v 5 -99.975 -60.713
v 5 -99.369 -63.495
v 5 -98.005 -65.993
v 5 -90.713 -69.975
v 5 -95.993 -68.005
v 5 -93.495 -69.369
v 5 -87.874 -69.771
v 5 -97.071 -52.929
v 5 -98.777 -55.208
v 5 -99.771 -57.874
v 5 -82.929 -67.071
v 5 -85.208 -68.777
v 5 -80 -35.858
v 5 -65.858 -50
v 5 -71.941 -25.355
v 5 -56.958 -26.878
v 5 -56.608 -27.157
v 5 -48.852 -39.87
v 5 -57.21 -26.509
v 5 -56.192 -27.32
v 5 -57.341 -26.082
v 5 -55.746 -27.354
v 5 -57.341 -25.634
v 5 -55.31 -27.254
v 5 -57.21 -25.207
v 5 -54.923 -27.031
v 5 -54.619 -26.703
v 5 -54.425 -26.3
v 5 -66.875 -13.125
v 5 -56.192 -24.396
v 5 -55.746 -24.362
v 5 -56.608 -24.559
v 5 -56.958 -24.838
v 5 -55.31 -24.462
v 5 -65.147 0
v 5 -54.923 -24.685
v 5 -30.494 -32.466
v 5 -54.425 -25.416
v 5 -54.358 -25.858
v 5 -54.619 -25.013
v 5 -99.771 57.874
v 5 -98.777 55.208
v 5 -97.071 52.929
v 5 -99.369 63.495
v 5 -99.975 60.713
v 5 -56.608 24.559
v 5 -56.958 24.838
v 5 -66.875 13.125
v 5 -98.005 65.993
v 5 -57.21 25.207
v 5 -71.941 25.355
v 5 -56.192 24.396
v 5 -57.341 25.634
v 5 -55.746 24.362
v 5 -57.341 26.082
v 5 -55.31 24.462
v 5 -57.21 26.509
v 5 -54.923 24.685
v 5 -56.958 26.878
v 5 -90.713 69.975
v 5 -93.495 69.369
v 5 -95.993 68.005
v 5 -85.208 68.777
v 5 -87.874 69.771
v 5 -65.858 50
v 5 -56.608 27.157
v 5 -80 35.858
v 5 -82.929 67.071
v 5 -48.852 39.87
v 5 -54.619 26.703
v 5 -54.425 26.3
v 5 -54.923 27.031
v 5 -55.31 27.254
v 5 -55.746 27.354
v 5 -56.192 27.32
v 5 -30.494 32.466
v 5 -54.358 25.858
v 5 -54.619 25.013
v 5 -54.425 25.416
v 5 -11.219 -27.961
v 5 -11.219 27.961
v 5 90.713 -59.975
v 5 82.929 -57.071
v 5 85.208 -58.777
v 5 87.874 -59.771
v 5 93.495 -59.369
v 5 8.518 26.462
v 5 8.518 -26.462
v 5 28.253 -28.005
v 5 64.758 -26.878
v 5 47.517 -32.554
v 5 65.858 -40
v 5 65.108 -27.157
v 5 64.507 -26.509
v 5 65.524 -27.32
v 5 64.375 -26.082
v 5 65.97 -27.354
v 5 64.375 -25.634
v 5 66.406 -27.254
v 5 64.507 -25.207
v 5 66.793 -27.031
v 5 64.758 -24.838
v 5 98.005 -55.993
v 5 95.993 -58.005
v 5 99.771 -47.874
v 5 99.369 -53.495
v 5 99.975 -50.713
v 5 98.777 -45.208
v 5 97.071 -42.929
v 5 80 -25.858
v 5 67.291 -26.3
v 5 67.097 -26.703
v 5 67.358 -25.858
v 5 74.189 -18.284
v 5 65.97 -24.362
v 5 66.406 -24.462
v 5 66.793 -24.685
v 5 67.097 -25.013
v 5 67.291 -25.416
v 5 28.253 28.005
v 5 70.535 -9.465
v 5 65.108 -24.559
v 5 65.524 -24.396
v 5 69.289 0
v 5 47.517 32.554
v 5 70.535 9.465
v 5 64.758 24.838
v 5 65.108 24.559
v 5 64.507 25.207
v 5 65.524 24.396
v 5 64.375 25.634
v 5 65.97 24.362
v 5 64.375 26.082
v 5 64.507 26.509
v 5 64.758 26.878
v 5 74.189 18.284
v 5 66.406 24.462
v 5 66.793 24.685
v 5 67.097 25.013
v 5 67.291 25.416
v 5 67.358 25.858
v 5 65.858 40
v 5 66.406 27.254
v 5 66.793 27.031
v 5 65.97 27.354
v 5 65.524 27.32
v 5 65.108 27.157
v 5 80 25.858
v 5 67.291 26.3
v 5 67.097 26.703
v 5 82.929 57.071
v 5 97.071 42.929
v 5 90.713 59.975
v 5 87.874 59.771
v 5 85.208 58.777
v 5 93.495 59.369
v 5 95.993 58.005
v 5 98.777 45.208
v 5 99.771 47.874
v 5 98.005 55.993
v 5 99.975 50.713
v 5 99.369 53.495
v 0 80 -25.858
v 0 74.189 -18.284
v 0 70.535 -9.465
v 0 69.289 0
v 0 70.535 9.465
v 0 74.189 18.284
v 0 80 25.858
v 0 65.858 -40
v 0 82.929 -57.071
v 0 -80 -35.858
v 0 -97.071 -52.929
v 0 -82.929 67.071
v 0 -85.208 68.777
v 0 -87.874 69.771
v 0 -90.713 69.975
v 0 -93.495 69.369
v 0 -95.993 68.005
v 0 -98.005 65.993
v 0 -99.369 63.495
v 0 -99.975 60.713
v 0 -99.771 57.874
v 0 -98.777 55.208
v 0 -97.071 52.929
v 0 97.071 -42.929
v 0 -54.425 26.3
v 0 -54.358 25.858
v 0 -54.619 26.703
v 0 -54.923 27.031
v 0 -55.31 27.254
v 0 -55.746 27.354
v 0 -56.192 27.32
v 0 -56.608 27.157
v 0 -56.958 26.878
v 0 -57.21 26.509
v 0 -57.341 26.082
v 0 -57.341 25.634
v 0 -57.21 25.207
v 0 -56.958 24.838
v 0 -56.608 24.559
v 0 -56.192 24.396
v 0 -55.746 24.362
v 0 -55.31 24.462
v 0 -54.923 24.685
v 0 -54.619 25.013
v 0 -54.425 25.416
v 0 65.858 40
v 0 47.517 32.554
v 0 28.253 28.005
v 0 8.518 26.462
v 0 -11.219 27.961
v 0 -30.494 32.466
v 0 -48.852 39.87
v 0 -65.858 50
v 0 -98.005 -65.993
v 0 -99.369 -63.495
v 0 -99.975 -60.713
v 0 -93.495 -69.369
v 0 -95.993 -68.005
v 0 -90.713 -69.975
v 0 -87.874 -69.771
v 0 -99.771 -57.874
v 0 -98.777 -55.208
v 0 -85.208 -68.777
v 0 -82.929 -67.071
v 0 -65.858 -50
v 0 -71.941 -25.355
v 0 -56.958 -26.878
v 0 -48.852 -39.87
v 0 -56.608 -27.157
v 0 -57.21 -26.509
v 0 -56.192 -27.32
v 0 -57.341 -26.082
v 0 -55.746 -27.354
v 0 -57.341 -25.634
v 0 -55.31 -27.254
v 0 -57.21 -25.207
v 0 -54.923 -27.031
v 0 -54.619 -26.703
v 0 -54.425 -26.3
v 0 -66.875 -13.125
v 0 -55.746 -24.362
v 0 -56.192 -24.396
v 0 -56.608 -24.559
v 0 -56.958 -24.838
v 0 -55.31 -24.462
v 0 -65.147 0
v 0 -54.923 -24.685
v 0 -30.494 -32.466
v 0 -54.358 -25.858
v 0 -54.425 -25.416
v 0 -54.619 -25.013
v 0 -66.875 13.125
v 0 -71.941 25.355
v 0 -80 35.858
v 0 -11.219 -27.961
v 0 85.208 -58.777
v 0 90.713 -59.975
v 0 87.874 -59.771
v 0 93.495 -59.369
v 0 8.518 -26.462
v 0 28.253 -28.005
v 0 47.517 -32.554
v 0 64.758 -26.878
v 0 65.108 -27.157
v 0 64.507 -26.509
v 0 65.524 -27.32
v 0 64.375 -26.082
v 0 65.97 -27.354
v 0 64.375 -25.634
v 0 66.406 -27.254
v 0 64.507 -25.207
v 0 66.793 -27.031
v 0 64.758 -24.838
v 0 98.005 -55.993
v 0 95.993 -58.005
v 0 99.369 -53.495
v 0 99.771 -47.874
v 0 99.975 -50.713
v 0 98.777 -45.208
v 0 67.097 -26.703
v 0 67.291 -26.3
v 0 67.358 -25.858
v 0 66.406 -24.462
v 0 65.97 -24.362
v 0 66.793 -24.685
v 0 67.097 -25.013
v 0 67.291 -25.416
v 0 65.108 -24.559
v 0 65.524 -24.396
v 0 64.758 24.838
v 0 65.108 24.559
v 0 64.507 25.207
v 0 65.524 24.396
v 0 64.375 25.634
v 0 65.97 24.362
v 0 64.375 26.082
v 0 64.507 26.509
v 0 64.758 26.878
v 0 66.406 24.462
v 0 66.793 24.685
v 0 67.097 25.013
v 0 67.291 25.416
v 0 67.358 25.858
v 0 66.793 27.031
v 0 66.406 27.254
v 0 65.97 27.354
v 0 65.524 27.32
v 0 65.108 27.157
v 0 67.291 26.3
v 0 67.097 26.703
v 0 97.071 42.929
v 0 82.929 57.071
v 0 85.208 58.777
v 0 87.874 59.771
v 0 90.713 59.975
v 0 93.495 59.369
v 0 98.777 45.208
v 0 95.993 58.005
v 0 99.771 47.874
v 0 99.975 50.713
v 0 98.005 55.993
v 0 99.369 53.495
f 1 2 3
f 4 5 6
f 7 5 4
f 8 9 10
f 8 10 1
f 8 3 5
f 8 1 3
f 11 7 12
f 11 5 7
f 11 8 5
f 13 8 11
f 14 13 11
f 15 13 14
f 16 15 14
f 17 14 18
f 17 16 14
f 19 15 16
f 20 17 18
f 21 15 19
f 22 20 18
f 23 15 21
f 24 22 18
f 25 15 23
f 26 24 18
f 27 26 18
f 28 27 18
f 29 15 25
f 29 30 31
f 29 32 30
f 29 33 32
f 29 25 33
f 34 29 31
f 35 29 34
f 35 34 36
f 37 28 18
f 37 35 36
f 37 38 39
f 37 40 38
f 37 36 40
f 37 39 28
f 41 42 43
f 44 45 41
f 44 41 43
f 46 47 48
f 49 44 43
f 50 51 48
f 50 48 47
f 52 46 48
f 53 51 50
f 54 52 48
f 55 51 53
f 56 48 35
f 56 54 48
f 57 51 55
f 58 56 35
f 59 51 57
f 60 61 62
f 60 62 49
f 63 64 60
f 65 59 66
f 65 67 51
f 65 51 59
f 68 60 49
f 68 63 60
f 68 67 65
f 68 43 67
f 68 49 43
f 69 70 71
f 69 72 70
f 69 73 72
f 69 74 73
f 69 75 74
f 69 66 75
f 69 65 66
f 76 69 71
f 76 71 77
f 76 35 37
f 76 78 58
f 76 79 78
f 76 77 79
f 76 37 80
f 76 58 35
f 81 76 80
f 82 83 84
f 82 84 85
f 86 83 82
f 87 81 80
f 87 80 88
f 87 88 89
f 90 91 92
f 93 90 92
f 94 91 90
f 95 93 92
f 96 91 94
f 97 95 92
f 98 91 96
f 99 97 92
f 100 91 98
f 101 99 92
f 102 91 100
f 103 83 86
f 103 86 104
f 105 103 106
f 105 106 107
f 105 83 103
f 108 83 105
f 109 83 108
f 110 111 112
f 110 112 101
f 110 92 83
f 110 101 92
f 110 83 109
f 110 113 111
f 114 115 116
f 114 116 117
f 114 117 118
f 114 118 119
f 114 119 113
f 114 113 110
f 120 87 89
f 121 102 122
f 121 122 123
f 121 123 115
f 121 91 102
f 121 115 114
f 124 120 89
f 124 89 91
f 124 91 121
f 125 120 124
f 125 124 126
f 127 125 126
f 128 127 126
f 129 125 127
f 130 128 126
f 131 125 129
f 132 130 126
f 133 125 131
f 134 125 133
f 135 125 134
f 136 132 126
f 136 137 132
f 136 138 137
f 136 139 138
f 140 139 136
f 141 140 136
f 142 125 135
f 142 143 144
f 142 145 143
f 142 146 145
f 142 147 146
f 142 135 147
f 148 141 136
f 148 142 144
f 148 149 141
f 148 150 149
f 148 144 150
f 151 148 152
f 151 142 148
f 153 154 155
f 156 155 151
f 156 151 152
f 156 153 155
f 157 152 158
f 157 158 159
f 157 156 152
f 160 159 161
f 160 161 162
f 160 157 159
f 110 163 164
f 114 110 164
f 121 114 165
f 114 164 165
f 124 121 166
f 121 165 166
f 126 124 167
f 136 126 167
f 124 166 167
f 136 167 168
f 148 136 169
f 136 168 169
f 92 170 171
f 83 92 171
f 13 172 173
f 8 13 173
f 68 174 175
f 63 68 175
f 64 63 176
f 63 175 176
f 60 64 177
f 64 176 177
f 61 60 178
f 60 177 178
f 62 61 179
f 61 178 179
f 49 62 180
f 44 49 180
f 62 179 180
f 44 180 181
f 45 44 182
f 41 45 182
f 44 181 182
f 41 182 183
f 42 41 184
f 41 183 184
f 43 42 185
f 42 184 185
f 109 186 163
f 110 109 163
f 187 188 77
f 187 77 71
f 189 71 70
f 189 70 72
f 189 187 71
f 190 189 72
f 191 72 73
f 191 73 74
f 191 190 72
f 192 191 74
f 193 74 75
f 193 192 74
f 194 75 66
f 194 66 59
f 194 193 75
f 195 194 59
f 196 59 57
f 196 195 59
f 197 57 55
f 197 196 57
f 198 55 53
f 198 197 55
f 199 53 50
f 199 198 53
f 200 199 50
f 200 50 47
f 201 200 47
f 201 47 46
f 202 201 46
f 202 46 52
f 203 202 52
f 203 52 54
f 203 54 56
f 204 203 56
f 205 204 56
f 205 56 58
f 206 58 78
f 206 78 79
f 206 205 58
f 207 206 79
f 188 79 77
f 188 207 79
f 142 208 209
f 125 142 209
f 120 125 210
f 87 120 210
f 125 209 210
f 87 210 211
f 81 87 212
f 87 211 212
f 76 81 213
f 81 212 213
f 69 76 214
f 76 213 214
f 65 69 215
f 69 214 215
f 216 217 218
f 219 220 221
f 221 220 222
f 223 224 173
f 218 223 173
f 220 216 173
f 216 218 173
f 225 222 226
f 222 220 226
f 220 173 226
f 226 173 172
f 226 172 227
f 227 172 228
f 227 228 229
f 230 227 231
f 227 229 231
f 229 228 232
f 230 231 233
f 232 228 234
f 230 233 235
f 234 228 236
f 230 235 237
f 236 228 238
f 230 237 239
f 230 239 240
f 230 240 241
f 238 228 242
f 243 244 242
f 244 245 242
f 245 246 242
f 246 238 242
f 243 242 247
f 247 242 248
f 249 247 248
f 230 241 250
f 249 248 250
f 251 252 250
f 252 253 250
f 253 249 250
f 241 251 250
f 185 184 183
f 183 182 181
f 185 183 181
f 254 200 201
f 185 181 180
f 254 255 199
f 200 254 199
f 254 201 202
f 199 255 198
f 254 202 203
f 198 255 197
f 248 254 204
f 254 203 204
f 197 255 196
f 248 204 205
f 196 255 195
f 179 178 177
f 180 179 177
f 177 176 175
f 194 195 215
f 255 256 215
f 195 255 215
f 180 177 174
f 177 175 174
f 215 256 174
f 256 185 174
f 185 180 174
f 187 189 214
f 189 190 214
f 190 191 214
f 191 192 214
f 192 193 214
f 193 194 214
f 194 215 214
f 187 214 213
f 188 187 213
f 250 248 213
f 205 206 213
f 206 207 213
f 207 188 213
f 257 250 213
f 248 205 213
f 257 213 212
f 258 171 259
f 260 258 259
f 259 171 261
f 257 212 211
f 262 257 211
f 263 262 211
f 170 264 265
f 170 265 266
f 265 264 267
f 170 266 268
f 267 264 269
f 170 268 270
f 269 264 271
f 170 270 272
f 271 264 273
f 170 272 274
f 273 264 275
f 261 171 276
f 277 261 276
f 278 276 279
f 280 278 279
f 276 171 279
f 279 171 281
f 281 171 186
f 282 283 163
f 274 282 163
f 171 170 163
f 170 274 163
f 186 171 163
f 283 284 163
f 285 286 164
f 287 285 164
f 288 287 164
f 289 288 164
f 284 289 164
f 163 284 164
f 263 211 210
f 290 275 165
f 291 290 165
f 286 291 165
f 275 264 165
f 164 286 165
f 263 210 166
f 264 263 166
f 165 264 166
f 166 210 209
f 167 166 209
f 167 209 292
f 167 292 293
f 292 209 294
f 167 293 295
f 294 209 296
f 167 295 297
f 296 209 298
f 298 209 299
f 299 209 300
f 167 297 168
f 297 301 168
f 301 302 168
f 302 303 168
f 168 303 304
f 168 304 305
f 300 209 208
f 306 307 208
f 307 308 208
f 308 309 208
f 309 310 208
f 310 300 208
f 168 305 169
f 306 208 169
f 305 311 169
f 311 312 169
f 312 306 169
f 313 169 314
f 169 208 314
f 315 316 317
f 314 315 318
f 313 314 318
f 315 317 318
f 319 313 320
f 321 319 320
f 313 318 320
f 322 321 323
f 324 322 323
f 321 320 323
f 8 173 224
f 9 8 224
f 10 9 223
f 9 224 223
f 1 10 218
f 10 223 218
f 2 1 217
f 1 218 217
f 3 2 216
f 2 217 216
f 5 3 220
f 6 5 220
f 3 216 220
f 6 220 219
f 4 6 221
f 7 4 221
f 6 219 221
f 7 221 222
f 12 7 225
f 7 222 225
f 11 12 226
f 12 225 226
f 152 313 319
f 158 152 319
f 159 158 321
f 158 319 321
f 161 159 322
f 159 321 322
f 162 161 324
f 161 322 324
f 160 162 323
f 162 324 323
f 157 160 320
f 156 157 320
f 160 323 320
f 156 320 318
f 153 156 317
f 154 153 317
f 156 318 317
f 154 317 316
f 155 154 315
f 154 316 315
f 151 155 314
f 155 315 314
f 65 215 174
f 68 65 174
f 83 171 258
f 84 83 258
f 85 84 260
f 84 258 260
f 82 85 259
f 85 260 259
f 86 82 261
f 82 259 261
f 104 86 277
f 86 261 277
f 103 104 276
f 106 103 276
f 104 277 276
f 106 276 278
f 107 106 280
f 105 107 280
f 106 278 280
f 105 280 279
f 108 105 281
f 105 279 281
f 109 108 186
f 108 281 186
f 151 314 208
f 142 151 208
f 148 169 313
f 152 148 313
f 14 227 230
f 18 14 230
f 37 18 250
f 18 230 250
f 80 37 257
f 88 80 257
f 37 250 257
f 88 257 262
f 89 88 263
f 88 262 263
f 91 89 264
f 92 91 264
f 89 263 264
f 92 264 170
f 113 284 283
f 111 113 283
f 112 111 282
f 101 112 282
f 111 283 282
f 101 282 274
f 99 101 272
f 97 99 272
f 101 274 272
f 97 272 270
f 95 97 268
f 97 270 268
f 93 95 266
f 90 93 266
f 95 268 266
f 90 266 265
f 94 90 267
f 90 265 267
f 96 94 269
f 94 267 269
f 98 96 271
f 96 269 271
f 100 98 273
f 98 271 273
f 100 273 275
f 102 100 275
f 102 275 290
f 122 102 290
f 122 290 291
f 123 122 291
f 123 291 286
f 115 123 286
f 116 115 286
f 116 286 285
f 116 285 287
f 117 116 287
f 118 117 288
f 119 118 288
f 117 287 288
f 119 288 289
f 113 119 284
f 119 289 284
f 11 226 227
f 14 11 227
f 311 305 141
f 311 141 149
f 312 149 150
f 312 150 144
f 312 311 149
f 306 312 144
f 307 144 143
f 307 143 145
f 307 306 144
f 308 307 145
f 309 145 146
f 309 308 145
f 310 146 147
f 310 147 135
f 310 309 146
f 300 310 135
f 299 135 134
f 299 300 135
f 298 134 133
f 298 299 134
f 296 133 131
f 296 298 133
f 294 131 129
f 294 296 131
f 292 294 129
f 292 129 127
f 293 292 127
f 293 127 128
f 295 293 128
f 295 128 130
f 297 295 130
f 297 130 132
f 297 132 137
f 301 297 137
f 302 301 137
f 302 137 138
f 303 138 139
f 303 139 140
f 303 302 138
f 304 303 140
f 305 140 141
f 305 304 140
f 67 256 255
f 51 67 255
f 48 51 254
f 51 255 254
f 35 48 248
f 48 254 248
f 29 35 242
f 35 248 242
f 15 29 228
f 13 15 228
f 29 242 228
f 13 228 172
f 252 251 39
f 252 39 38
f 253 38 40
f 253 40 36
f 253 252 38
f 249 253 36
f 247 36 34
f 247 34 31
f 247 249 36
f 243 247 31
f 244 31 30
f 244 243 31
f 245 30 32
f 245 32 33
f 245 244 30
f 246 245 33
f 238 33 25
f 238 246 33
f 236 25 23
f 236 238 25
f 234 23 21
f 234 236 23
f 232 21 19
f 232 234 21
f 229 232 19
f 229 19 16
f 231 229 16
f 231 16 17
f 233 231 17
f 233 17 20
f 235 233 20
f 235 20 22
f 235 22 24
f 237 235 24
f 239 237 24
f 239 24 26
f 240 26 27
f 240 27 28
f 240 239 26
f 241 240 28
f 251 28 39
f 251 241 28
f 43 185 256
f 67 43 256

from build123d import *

# Parameters (mm, degrees)
F0_R     = 1.5
F1_DEPTH = 5


with BuildPart() as f1:
    # F0 (on Right) → F1 (new body)
    with BuildSketch(Plane.YZ):
        with BuildLine():
            Line((80.000096, 25.85796), (97.071068, 42.928932))
            ThreePointArc((97.071068, 42.928932), (97.071068, 57.071068), (82.928932, 57.071068))
            Line((82.928932, 57.071068), (65.857864, 40))
            ThreePointArc((65.857864, 40), (-1.379349, 26.831799), (-65.857864, 50))
            Line((-65.857864, 50), (-82.928932, 67.071068))
            ThreePointArc((-82.928932, 67.071068), (-97.071068, 67.071068), (-97.071068, 52.928932))
            Line((-97.071068, 52.928932), (-80.000096, 35.85796))
            ThreePointArc((-80.000096, 35.85796), (-65.147242, 0), (-80.000096, -35.85796))
            Line((-80.000096, -35.85796), (-97.071068, -52.928932))
            ThreePointArc((-97.071068, -52.928932), (-97.071068, -67.071068), (-82.928932, -67.071068))
            Line((-82.928932, -67.071068), (-65.857864, -50))
            ThreePointArc((-65.857864, -50), (-1.379349, -26.831799), (65.857864, -40))
            Line((65.857864, -40), (82.928932, -57.071068))
            ThreePointArc((82.928932, -57.071068), (97.071068, -57.071068), (97.071068, -42.928932))
            Line((97.071068, -42.928932), (80.000096, -25.85796))
            ThreePointArc((80.000096, -25.85796), (69.289378, 0), (80.000096, 25.85796))
        make_face()
        with Locations((-55.858192, -25.85796)):
            Circle(F0_R, mode=Mode.SUBTRACT)
        with BuildLine():
            ThreePointArc((64.35796, -25.85796), (65.85796, -24.35796), (67.35796, -25.85796))
            ThreePointArc((67.35796, -25.85796), (65.85796, -27.35796), (64.35796, -25.85796))
        make_face(mode=Mode.SUBTRACT)
        with Locations((-55.858192, 25.85796)):
            Circle(F0_R, mode=Mode.SUBTRACT)
        with Locations((65.85796, 25.85796)):
            Circle(F0_R, mode=Mode.SUBTRACT)
    extrude(amount=F1_DEPTH)


solid = f1.part
